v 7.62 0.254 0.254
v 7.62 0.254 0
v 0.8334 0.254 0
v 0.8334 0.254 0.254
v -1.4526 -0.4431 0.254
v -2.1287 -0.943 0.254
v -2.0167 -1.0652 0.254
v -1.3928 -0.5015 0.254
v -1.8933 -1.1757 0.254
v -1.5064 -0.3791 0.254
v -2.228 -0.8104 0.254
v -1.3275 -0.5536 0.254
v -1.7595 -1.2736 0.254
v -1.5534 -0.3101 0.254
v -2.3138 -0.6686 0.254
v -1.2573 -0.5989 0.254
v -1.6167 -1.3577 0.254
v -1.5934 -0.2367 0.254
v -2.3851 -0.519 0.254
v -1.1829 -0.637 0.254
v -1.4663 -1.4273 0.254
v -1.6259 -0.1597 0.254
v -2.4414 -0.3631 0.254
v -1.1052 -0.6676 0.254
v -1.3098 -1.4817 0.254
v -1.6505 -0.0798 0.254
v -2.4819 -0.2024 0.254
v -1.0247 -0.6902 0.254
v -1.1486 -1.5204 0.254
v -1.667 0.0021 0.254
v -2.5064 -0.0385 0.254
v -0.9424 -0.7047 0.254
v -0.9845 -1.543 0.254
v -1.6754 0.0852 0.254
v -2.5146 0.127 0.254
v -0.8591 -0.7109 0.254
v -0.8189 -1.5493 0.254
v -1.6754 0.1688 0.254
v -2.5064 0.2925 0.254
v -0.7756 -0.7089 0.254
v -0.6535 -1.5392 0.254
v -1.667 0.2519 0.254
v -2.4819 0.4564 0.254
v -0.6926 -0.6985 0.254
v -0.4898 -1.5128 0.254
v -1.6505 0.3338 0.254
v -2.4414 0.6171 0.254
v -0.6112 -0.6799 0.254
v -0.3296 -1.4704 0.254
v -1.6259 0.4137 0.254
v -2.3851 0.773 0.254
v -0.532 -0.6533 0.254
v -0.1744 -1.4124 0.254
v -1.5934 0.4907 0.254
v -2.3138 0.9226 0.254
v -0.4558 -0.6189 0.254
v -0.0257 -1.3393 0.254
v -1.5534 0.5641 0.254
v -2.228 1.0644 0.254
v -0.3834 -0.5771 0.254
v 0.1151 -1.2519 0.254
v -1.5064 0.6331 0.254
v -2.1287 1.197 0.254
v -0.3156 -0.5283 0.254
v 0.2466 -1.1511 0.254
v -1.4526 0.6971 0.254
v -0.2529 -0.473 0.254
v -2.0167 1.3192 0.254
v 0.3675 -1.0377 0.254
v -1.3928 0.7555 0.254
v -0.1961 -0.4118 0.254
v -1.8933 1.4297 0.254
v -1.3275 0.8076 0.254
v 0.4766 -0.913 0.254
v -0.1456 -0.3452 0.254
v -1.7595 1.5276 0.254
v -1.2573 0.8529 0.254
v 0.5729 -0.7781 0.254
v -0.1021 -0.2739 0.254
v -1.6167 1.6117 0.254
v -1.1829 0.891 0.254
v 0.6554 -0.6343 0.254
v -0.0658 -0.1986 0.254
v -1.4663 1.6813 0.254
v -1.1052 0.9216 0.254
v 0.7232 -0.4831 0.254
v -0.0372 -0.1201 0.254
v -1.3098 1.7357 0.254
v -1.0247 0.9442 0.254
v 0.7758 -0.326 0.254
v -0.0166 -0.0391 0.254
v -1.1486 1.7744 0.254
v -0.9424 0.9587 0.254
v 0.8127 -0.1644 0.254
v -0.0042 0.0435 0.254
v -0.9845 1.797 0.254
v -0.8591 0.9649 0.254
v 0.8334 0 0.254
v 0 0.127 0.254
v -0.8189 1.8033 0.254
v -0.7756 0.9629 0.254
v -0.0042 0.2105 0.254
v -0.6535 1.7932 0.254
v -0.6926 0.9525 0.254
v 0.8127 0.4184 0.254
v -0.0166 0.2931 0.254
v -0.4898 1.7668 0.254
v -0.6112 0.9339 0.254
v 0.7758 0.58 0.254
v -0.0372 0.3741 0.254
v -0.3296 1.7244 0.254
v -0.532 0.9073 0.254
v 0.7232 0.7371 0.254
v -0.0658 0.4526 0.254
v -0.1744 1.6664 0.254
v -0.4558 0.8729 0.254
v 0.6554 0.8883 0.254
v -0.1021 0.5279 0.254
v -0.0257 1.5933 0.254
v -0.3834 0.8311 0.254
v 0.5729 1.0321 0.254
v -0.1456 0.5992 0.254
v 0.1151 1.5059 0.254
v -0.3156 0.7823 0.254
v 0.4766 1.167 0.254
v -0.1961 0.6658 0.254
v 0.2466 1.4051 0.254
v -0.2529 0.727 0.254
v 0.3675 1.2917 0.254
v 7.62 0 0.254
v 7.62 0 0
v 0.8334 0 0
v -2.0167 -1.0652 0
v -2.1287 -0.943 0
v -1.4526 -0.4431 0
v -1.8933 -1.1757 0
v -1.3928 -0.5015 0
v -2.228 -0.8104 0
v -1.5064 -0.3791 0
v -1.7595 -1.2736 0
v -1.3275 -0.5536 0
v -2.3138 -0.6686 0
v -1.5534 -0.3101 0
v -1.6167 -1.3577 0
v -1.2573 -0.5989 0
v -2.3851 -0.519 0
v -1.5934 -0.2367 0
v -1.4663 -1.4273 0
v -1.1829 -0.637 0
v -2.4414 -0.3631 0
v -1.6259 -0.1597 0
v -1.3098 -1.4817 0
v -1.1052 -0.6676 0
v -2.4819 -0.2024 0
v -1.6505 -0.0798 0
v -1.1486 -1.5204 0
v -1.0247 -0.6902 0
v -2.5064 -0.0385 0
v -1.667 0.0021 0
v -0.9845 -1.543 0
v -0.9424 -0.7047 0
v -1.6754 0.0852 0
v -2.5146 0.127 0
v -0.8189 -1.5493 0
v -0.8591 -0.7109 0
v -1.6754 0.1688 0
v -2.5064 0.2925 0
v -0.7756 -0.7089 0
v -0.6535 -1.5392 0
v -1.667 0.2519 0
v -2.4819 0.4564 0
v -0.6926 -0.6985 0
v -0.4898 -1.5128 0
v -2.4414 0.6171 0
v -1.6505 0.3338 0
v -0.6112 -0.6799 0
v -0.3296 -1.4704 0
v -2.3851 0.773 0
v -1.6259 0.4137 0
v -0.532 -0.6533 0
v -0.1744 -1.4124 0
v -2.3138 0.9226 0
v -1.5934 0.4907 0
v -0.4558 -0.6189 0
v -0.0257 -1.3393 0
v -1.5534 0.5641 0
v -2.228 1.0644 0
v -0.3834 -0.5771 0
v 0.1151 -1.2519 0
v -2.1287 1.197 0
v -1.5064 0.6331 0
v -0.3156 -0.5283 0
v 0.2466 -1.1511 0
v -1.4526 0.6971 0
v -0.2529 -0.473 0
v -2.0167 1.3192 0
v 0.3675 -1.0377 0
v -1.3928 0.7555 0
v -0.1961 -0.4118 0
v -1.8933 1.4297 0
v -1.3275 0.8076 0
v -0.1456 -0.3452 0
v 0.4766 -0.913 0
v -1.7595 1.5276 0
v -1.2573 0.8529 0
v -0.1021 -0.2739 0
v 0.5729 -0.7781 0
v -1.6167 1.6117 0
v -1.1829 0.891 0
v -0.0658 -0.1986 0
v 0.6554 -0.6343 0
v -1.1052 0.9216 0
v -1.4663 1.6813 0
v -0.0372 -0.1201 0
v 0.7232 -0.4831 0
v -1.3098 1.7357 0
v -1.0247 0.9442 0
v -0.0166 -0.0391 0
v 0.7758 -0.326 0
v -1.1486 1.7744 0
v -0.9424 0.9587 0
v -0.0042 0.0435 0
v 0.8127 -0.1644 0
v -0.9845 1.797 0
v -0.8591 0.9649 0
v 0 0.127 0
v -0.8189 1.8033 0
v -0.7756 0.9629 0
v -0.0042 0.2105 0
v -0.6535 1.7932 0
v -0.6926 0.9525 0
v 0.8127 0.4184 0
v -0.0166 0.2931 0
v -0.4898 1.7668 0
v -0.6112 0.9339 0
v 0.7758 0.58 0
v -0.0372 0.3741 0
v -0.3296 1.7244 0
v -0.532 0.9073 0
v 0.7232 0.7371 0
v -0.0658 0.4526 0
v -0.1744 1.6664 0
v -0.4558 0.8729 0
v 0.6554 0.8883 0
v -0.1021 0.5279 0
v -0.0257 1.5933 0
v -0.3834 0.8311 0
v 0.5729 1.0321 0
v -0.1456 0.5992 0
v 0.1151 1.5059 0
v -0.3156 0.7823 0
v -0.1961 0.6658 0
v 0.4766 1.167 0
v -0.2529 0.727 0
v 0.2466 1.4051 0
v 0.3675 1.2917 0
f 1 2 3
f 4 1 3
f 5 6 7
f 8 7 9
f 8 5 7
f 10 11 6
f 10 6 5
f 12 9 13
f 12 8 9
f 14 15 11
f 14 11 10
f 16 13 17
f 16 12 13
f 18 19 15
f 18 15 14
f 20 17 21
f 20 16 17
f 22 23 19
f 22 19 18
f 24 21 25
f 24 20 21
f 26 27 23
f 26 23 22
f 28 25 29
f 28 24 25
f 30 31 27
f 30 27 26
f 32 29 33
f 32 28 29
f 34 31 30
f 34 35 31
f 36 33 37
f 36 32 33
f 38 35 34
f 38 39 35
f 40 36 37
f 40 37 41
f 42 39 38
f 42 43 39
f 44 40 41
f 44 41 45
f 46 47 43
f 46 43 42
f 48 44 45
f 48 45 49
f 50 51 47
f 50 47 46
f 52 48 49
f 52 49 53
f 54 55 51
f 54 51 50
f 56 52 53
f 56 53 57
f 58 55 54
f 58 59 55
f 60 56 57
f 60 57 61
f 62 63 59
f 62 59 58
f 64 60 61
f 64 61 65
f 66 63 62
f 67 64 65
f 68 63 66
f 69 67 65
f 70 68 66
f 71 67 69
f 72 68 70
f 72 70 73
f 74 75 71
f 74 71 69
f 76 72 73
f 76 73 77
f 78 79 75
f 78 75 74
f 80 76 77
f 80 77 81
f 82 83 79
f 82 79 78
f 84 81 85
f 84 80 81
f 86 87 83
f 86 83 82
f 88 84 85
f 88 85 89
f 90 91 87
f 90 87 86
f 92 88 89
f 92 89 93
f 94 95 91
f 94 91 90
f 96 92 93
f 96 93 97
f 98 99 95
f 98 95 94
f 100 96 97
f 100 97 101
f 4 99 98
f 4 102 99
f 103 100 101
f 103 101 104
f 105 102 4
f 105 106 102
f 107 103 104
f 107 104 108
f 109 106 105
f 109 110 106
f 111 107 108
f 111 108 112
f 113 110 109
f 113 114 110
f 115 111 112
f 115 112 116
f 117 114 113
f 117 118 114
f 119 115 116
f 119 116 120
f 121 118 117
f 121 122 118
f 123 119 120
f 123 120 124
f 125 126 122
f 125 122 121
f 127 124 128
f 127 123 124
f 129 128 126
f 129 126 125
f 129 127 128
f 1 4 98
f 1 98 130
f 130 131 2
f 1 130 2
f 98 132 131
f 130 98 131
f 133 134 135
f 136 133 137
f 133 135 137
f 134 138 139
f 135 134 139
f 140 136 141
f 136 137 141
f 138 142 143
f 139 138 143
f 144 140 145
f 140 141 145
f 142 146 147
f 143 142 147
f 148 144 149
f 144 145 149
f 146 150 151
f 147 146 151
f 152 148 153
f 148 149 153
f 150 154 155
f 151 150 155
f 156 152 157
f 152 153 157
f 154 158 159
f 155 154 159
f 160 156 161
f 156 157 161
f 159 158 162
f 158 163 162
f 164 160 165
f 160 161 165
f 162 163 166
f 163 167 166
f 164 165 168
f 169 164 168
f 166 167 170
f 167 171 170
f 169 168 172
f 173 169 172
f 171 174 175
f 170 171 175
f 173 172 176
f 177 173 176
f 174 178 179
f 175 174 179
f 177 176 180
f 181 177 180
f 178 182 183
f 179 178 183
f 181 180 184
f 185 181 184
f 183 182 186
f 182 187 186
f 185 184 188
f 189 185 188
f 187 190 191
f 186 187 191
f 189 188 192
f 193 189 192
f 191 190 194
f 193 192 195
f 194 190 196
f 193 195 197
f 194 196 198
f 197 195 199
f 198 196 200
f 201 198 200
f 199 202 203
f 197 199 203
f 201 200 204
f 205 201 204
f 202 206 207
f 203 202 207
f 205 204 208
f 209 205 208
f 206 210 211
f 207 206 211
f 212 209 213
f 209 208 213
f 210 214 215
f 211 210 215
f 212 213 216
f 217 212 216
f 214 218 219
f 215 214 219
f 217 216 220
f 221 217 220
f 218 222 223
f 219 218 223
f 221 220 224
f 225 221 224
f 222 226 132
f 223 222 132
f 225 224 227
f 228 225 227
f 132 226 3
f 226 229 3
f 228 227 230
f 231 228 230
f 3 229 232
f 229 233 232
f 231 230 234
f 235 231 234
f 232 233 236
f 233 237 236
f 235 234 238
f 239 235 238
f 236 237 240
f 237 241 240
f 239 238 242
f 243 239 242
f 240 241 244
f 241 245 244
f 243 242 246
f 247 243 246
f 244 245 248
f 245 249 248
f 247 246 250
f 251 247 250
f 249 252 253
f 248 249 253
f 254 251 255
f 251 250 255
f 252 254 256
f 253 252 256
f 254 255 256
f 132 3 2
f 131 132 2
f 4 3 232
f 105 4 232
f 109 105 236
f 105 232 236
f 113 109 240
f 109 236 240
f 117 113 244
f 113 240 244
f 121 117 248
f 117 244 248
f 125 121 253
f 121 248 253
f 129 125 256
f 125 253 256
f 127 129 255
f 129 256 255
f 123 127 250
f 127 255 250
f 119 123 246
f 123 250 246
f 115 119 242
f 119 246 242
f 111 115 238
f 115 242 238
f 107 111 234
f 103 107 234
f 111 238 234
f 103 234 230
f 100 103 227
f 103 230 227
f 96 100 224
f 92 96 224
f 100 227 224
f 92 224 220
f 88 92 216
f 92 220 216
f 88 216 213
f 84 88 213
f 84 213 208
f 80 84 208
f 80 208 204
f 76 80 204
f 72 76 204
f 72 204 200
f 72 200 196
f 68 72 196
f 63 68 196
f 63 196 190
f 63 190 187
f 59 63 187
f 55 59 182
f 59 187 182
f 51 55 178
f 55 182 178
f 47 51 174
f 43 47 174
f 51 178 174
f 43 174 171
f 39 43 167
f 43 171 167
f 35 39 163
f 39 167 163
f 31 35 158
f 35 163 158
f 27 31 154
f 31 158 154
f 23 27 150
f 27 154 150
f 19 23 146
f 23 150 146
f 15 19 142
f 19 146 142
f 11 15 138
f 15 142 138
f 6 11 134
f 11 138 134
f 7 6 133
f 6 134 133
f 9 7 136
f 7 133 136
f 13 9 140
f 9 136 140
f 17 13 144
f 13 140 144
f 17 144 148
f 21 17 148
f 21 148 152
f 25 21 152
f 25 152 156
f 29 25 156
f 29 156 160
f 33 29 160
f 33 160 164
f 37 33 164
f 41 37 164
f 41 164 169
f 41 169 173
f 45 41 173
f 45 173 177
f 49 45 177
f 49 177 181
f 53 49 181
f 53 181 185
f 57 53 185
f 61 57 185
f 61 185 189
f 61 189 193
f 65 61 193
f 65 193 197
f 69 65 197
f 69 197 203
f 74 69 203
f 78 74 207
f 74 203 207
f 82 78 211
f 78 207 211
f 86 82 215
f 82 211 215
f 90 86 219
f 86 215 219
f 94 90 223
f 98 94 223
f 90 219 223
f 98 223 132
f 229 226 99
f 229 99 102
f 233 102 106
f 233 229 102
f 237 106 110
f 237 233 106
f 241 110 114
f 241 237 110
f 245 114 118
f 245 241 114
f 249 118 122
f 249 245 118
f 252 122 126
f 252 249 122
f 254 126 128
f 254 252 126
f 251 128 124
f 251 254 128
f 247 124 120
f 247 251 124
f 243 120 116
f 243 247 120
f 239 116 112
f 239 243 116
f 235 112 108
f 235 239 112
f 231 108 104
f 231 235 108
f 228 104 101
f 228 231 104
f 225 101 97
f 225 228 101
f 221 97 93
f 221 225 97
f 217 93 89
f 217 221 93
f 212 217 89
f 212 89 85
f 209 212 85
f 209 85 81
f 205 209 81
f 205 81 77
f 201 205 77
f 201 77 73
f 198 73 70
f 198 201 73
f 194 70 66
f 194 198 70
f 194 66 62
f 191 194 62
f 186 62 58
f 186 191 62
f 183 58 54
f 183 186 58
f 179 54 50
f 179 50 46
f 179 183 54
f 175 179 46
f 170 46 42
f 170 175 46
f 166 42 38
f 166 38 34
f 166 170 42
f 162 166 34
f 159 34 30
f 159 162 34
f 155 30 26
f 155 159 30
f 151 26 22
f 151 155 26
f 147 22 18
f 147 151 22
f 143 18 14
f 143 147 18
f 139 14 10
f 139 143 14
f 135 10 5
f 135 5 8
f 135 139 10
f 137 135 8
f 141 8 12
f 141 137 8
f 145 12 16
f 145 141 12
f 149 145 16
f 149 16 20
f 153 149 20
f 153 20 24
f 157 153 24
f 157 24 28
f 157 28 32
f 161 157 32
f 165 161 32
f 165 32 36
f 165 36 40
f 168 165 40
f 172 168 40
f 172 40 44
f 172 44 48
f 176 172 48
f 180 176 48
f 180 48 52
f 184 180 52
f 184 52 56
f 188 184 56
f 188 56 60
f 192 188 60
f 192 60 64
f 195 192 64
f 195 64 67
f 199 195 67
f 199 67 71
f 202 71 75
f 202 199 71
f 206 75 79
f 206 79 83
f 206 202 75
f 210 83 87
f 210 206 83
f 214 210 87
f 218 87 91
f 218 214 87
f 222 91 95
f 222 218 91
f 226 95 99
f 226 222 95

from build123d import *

# Parameters (mm, degrees)
F0_R     = 0.8382
F1_DEPTH = 0.254


with BuildPart() as f1:
    # F0 (on Top) → F1 (new body)
    with BuildSketch(Plane.XY):
        with BuildLine():
            Line((0, 0.127), (0, 0))
            Line((0, 0), (0.8333824718, 0))
            ThreePointArc((0.8333824718, 0), (0.836995185, 0.0634543302), (0.8382, 0.127))
            Line((0.8382, 0.127), (0, 0.127))
        make_face()
        with BuildLine():
            Line((0.8333824718, 0), (0, 0))
            Line((0, 0), (0, 0.127))
            Line((0, 0.127), (0, 0.254))
            Line((0, 0.254), (0.8333824718, 0.254))
            ThreePointArc((0.8333824718, 0.254), (-2.5146, 0.127), (0.8333824718, 0))
        make_face()
        with Locations((-0.8382, 0.127)):
            Circle(F0_R, mode=Mode.SUBTRACT)
        with BuildLine():
            ThreePointArc((0.8382, 0.127), (0.836995185, 0.0634543302), (0.8333824718, 0))
            Line((0.8333824718, 0), (7.62, 0))
            Line((7.62, 0), (7.62, 0.254))
            Line((7.62, 0.254), (0.8333824718, 0.254))
            ThreePointArc((0.8333824718, 0.254), (0.836995185, 0.1905456698), (0.8382, 0.127))
        make_face()
        with BuildLine():
            Line((0, 0.254), (0, 0.127))
            Line((0, 0.127), (0.8382, 0.127))
            ThreePointArc((0.8382, 0.127), (0.836995185, 0.1905456698), (0.8333824718, 0.254))
            Line((0.8333824718, 0.254), (0, 0.254))
        make_face()
    extrude(amount=F1_DEPTH)


solid = f1.part
